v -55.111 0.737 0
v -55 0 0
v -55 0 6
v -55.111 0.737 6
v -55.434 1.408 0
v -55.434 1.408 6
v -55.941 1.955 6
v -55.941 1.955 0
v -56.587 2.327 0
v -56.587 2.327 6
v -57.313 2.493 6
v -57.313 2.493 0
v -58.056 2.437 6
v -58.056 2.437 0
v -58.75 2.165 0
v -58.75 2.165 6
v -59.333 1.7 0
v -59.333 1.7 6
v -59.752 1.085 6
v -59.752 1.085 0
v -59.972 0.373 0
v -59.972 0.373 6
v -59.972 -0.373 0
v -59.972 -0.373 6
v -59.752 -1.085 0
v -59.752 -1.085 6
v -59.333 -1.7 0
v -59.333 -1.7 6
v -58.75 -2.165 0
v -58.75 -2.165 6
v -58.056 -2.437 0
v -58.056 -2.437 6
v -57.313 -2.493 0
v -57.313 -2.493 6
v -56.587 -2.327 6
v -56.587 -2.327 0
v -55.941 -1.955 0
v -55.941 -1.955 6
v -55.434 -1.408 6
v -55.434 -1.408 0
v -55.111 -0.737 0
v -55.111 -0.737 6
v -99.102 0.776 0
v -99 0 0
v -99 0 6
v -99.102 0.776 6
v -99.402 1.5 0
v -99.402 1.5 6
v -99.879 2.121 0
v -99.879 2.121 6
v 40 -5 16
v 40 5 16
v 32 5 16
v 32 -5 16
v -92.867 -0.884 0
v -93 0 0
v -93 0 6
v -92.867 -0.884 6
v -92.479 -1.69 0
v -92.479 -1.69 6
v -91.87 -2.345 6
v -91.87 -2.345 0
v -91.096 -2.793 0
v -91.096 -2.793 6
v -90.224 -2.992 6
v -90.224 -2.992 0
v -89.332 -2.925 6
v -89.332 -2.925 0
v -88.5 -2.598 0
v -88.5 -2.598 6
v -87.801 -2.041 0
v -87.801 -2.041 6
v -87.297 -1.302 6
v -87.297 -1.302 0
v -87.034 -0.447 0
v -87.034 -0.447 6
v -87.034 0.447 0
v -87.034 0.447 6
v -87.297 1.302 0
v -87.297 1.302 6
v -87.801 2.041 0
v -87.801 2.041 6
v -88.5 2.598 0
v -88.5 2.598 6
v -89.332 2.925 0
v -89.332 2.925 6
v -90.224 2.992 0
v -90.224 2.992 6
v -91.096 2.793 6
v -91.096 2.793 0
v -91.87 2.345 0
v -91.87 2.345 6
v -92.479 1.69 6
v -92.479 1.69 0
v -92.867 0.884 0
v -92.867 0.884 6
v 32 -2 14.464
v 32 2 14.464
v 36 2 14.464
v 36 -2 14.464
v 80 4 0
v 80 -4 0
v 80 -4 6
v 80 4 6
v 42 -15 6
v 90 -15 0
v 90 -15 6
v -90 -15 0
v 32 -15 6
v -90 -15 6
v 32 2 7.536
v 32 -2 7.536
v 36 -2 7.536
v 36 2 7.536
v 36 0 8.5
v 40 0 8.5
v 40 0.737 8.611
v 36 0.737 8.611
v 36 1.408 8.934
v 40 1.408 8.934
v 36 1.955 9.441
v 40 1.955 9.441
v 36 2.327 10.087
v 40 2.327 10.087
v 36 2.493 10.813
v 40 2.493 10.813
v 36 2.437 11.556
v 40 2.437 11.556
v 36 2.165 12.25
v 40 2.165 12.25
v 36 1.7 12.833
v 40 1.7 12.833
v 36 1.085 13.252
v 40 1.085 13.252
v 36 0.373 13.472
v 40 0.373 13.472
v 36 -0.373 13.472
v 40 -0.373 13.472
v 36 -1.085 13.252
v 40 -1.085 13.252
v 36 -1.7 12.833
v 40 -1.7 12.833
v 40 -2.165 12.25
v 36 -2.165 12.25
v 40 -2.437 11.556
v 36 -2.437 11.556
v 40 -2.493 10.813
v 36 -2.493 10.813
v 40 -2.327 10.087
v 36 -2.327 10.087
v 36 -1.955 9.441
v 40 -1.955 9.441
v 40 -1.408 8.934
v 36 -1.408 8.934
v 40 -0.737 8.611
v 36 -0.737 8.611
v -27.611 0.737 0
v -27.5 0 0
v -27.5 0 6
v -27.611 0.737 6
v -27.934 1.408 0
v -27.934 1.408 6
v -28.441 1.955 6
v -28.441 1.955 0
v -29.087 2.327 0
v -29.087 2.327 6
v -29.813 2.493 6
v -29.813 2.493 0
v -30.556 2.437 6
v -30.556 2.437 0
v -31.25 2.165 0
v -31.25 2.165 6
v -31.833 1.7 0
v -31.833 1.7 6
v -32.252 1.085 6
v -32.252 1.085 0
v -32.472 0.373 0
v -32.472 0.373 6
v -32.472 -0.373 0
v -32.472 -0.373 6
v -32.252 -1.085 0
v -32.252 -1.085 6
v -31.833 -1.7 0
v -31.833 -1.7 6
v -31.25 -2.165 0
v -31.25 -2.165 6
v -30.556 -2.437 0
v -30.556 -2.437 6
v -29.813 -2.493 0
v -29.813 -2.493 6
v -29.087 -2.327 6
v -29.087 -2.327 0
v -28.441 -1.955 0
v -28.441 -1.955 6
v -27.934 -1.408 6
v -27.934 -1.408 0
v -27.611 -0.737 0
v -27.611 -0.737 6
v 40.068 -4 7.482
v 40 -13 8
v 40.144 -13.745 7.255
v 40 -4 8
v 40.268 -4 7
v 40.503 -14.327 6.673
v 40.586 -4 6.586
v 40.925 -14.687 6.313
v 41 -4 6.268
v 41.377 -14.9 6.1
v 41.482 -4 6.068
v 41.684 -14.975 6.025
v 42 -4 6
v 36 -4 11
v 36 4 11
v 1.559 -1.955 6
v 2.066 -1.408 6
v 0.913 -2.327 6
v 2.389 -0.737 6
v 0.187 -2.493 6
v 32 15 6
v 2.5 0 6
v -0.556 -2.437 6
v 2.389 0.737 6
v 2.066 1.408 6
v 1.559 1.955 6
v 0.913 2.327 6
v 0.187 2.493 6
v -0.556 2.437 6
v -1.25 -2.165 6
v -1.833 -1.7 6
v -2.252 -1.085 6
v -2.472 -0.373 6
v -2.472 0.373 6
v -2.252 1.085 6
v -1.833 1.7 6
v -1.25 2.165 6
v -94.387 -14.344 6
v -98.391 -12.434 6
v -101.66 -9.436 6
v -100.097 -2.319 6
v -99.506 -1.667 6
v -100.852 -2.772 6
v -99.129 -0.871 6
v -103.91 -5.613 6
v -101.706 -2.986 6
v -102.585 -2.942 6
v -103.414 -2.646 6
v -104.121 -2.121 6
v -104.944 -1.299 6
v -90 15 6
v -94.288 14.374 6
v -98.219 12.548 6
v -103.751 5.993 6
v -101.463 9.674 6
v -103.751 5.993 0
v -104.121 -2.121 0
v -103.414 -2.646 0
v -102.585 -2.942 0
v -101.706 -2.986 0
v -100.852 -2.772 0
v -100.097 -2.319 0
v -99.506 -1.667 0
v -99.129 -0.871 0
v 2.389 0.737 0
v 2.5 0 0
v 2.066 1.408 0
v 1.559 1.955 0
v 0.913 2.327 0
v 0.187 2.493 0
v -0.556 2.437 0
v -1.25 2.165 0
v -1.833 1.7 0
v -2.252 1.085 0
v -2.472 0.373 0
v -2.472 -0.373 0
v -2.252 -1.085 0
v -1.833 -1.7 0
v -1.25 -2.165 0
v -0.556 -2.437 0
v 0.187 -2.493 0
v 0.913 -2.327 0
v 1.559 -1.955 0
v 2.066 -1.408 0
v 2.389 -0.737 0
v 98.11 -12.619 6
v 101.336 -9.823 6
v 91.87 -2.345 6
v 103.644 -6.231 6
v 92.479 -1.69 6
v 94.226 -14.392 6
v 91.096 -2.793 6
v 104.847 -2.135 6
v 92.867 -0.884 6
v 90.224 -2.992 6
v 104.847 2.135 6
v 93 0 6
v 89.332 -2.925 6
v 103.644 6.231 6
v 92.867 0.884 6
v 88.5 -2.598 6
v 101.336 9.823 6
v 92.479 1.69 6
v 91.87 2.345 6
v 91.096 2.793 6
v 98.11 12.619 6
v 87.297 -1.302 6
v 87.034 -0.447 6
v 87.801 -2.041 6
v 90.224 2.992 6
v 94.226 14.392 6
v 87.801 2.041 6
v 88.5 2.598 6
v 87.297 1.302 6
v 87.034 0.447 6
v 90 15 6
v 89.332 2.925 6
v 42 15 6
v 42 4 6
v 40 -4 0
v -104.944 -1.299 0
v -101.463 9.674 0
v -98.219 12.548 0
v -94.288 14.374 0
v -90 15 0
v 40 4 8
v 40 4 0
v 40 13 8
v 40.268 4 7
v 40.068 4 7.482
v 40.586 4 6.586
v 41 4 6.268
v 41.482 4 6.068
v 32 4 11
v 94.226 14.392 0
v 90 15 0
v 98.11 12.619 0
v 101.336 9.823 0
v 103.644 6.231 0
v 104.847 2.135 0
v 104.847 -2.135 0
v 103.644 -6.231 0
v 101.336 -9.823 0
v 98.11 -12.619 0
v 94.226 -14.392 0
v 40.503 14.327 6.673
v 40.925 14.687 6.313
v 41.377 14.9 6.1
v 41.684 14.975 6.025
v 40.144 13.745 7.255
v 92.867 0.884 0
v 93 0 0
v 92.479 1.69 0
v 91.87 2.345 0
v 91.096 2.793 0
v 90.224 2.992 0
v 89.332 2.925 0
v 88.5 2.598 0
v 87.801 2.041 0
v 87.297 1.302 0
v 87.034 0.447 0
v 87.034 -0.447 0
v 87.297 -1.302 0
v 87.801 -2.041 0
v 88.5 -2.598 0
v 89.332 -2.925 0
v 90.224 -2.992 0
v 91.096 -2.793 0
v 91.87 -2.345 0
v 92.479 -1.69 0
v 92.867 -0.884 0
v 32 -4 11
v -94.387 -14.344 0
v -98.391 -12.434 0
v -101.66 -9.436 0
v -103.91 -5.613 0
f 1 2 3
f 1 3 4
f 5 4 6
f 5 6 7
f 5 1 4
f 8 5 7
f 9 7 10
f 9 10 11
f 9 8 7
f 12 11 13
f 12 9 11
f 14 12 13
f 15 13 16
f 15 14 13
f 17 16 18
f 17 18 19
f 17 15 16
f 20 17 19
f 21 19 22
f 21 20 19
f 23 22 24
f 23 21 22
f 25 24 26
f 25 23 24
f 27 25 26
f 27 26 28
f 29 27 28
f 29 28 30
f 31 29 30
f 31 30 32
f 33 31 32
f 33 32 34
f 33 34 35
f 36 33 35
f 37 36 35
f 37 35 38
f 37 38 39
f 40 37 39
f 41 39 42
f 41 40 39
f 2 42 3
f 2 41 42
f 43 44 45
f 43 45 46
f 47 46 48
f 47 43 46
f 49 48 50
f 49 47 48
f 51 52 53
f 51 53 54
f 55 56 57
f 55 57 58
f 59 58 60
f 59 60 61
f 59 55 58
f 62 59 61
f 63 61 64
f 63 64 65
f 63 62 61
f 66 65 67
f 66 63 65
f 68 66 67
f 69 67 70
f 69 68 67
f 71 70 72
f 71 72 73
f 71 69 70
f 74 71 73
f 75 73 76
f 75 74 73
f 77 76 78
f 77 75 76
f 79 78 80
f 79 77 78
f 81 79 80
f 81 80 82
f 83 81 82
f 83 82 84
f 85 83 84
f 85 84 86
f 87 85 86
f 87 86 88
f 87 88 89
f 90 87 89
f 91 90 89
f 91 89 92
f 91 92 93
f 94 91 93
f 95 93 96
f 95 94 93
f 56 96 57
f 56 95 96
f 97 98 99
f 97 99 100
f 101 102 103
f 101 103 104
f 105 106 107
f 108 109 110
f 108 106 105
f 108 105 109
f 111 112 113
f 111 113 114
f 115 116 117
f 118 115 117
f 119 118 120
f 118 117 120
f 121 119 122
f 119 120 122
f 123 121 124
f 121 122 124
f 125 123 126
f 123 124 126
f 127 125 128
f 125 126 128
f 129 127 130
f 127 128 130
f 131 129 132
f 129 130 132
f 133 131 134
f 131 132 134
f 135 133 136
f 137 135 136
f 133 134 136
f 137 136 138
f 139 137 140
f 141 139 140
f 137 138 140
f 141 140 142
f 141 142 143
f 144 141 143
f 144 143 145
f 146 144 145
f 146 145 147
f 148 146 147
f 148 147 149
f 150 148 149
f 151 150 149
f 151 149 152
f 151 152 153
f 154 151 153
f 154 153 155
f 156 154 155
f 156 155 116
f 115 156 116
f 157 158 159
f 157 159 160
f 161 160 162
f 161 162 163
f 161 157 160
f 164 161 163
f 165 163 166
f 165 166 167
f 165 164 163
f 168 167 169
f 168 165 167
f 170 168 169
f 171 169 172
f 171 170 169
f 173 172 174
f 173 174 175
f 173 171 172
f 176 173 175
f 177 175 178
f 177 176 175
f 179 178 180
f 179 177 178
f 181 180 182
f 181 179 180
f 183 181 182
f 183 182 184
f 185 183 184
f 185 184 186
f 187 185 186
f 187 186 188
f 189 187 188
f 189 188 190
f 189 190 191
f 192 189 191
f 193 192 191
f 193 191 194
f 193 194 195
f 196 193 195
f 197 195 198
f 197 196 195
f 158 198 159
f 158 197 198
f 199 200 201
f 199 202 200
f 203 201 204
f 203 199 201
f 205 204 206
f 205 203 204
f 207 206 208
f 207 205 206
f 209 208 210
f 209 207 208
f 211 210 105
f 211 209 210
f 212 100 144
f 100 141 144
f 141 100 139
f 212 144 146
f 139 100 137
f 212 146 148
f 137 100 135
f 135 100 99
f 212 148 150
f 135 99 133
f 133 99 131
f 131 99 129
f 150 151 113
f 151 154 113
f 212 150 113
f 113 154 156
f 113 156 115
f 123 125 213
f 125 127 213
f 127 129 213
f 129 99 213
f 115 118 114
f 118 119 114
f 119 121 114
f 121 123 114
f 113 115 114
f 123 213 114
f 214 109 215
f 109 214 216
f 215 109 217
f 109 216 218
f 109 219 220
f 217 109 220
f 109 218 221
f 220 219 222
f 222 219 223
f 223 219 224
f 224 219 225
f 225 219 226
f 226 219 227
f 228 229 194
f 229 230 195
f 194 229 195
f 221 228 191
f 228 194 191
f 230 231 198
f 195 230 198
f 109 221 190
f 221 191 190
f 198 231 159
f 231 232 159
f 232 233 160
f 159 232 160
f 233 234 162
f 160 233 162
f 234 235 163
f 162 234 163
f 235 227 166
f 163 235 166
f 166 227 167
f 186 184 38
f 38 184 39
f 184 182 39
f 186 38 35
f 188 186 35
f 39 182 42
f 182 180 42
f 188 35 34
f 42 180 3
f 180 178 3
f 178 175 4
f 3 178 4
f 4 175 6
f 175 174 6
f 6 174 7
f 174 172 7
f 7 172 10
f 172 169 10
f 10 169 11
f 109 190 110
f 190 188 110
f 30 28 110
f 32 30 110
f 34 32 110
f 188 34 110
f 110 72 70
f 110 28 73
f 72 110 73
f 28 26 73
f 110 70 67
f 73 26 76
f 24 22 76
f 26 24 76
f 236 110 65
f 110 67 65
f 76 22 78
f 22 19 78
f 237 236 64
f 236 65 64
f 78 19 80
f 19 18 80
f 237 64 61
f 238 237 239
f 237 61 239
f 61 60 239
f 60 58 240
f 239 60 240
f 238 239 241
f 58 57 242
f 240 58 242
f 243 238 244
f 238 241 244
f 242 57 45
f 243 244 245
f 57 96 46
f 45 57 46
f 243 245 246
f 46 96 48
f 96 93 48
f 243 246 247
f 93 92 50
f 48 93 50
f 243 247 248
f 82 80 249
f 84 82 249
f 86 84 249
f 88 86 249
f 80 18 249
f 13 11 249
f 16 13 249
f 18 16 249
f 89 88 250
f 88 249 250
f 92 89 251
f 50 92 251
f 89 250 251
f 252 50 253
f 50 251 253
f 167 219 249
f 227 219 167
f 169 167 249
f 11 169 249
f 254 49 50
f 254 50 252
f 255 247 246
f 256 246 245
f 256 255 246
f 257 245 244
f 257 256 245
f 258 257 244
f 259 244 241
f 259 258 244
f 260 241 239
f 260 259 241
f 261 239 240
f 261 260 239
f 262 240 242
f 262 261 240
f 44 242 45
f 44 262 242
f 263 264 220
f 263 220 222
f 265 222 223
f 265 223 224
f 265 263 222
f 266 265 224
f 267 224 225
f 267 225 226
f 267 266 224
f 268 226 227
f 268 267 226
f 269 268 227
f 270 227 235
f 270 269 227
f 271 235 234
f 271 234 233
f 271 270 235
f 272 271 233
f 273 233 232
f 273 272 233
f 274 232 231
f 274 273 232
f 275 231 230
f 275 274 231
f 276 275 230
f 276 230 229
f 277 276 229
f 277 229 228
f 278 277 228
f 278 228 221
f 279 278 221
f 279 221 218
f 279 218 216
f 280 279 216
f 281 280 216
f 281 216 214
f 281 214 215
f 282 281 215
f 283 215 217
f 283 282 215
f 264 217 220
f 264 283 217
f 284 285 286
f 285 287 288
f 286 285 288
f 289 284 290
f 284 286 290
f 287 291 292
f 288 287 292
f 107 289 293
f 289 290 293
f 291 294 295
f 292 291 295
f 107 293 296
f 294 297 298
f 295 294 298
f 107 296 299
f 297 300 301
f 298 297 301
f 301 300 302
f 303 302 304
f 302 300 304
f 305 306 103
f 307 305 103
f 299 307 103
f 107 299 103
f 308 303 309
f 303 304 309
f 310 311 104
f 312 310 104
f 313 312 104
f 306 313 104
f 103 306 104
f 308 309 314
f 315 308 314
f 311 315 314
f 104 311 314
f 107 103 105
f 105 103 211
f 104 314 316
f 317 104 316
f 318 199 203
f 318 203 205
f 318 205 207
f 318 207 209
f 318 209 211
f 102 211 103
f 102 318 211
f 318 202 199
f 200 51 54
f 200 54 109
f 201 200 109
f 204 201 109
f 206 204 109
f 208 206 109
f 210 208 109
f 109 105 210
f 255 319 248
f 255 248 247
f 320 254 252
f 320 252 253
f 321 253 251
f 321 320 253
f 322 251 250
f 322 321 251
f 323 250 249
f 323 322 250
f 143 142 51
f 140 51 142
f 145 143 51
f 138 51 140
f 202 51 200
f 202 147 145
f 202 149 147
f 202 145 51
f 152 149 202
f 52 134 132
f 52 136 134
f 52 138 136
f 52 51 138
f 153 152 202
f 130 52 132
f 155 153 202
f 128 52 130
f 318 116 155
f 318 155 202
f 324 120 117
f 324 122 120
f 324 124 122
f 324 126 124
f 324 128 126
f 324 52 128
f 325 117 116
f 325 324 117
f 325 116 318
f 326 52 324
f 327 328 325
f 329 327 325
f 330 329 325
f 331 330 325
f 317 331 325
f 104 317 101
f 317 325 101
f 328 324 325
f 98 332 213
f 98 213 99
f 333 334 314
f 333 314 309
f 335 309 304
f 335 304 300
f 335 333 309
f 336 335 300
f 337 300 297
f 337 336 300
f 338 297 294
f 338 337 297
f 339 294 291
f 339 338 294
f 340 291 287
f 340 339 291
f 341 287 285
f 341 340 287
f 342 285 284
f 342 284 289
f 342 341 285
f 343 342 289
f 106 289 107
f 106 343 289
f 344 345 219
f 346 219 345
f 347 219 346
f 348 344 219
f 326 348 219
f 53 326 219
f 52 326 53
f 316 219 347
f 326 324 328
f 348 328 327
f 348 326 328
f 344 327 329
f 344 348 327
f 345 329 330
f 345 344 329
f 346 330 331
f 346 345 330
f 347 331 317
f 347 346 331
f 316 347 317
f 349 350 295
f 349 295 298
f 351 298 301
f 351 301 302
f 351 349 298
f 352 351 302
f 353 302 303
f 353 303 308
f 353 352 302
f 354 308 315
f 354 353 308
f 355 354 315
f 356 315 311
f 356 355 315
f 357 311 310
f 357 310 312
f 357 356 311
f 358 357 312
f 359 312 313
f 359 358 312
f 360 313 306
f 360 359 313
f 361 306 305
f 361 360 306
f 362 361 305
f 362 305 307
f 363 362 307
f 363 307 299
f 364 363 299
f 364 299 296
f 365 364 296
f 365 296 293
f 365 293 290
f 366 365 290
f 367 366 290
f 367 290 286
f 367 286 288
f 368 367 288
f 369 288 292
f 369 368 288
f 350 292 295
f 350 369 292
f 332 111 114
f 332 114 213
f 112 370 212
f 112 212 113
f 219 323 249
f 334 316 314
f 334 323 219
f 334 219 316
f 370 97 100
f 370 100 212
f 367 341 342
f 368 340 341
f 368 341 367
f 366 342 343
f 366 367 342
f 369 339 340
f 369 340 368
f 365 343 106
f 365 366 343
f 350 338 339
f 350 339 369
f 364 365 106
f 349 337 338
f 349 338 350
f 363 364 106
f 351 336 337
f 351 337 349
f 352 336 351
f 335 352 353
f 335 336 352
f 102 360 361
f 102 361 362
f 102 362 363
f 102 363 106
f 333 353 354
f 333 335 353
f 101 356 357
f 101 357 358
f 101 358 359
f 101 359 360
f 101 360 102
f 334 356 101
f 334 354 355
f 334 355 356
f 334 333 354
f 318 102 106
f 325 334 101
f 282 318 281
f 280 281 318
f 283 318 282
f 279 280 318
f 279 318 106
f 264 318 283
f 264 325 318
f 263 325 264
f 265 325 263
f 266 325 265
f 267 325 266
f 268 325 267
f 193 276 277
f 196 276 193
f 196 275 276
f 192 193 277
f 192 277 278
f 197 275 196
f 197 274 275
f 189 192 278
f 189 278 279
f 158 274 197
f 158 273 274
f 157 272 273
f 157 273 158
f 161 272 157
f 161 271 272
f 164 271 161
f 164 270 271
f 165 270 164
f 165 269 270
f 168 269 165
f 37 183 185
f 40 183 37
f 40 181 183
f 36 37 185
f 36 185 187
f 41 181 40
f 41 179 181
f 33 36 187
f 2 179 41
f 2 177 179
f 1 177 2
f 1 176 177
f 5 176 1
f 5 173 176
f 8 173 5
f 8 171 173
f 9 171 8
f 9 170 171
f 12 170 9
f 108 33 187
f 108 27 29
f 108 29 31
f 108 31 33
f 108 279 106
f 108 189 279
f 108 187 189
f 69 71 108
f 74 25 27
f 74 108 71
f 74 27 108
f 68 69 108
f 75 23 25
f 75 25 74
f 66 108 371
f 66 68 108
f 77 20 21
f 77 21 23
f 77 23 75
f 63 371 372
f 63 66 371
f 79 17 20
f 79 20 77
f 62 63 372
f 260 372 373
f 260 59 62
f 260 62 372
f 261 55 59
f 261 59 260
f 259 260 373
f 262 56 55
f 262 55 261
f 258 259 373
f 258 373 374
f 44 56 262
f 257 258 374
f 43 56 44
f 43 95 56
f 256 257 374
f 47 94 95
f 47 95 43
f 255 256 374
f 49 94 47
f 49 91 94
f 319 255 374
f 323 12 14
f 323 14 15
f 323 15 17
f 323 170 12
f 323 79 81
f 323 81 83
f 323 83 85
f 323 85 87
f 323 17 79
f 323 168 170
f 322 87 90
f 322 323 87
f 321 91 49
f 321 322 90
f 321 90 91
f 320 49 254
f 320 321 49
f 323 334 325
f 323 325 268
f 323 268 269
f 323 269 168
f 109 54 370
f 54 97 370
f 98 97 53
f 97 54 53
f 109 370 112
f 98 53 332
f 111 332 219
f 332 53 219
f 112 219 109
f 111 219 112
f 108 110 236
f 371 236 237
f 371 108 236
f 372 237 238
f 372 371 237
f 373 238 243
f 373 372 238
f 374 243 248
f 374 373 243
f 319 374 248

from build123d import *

# Parameters (mm, degrees)
ESQUISSE1_R             = 3
ESQUISSE1_R_2           = 2.5
ESQUISSE1_W             = 40
ESQUISSE1_H             = 8
BOSS_EXTRU_1_DEPTH      = 6
ESQUISSE2_R             = 2.5
BOSS_EXTRU_2_DEPTH      = 8
CONG_2_R                = 2
ENL_V_MAT_EXTRU_1_DEPTH = 4
ENL_V_START             = -10
ENL_V_MAT_EXTRU_4_DEPTH = 10


with BuildPart() as part:
    # Esquisse1 → Boss.-Extru.1 (new body)
    with BuildSketch(Plane.XY):
        with BuildLine():
            Line((90, -15), (-90, -15))
            ThreePointArc((-90, -15), (-105, 0), (-90, 15))
            Line((-90, 15), (90, 15))
            ThreePointArc((90, 15), (105, 0), (90, -15))
        make_face()
        with Locations((90, 0)):
            Circle(ESQUISSE1_R, mode=Mode.SUBTRACT)
        with Locations(Location((-90, 0, 0), (0, 0, 180))):
            Circle(ESQUISSE1_R, mode=Mode.SUBTRACT)
        Circle(ESQUISSE1_R_2, mode=Mode.SUBTRACT)
        with Locations((-57.5, 0)):
            Circle(ESQUISSE1_R_2, mode=Mode.SUBTRACT)
        with Locations((-30, 0)):
            Circle(ESQUISSE1_R_2, mode=Mode.SUBTRACT)
        with Locations((60, 0)):
            Rectangle(ESQUISSE1_W, ESQUISSE1_H, mode=Mode.SUBTRACT)
    extrude(amount=BOSS_EXTRU_1_DEPTH)

    # Esquisse2 → Boss.-Extru.2 (add)
    with BuildSketch(Plane(origin=(40, 0, 0), x_dir=(0, 0, -1), z_dir=(1, 0, 0))):
        Polygon((-16, 5), (-16, -5), (-6, -15), (-6, -5), (-6, 5), (-6, 15), align=None)
        with Locations((-11, 0)):
            Circle(ESQUISSE2_R, mode=Mode.SUBTRACT)
    extrude(amount=-BOSS_EXTRU_2_DEPTH)

    # Congé2
    cong_2_edges = [part.edges().sort_by_distance(p)[0] for p in [
        (40, 9.5, 6),
        (40, -9.5, 6),
    ]]
    fillet(cong_2_edges, radius=CONG_2_R)

    # Esquisse3 → Enlèv. mat.-Extru.1 (cut)
    with BuildSketch(Plane.ZY.offset(-32)):
        Polygon((11, 4), (14.464101615, 2), (14.464101615, -2), (11, -4), (7.535898385, -2), (7.535898385, 2), align=None)
    extrude(amount=-ENL_V_MAT_EXTRU_1_DEPTH, mode=Mode.SUBTRACT)

    # Esquisse4 → Enlèv. mat.-Extru.4 (cut)
    with BuildSketch(Plane.XY.offset(6).offset(ENL_V_START)):
        with BuildLine():
            ThreePointArc((-105, 0), (-104.771638598, -1.148050297), (-104.121320344, -2.121320344))
            Line((-104.121320344, -2.121320344), (-99.878679656, 2.121320344))
            ThreePointArc((-99.878679656, 2.121320344), (-103.148050297, 2.771638598), (-105, 0))
        make_face()
        with BuildLine():
            Line((-99.878679656, 2.121320344), (-104.121320344, -2.121320344))
            ThreePointArc((-104.121320344, -2.121320344), (-100.851949703, -2.771638598), (-99, 0))
            ThreePointArc((-99, 0), (-99.228361402, 1.148050297), (-99.878679656, 2.121320344))
        make_face()
        with BuildLine():
            ThreePointArc((-105, 0), (-103.148050297, 2.771638598), (-99.878679656, 2.121320344))
            Line((-99.878679656, 2.121320344), (-103.750652313, 5.993293))
            ThreePointArc((-103.750652313, 5.993293), (-104.68434174, 3.061063158), (-105, 0))
        make_face()
        with BuildLine():
            Line((-104.94364809, -1.298992597), (-104.121320344, -2.121320344))
            ThreePointArc((-104.121320344, -2.121320344), (-104.771638598, -1.148050297), (-105, 0))
            ThreePointArc((-105, 0), (-104.985905401, -0.650107165), (-104.94364809, -1.298992597))
        make_face()
        with BuildLine():
            ThreePointArc((-105, 0), (-104.771638598, -1.148050297), (-104.121320344, -2.121320344))
            Line((-104.121320344, -2.121320344), (-99.878679656, 2.121320344))
            ThreePointArc((-99.878679656, 2.121320344), (-103.148050297, 2.771638598), (-105, 0))
        make_face()
        with BuildLine():
            Line((-99.878679656, 2.121320344), (-104.121320344, -2.121320344))
            ThreePointArc((-104.121320344, -2.121320344), (-100.851949703, -2.771638598), (-99, 0))
            ThreePointArc((-99, 0), (-99.228361402, 1.148050297), (-99.878679656, 2.121320344))
        make_face()
    extrude(amount=ENL_V_MAT_EXTRU_4_DEPTH, mode=Mode.SUBTRACT)


solid = part.part
